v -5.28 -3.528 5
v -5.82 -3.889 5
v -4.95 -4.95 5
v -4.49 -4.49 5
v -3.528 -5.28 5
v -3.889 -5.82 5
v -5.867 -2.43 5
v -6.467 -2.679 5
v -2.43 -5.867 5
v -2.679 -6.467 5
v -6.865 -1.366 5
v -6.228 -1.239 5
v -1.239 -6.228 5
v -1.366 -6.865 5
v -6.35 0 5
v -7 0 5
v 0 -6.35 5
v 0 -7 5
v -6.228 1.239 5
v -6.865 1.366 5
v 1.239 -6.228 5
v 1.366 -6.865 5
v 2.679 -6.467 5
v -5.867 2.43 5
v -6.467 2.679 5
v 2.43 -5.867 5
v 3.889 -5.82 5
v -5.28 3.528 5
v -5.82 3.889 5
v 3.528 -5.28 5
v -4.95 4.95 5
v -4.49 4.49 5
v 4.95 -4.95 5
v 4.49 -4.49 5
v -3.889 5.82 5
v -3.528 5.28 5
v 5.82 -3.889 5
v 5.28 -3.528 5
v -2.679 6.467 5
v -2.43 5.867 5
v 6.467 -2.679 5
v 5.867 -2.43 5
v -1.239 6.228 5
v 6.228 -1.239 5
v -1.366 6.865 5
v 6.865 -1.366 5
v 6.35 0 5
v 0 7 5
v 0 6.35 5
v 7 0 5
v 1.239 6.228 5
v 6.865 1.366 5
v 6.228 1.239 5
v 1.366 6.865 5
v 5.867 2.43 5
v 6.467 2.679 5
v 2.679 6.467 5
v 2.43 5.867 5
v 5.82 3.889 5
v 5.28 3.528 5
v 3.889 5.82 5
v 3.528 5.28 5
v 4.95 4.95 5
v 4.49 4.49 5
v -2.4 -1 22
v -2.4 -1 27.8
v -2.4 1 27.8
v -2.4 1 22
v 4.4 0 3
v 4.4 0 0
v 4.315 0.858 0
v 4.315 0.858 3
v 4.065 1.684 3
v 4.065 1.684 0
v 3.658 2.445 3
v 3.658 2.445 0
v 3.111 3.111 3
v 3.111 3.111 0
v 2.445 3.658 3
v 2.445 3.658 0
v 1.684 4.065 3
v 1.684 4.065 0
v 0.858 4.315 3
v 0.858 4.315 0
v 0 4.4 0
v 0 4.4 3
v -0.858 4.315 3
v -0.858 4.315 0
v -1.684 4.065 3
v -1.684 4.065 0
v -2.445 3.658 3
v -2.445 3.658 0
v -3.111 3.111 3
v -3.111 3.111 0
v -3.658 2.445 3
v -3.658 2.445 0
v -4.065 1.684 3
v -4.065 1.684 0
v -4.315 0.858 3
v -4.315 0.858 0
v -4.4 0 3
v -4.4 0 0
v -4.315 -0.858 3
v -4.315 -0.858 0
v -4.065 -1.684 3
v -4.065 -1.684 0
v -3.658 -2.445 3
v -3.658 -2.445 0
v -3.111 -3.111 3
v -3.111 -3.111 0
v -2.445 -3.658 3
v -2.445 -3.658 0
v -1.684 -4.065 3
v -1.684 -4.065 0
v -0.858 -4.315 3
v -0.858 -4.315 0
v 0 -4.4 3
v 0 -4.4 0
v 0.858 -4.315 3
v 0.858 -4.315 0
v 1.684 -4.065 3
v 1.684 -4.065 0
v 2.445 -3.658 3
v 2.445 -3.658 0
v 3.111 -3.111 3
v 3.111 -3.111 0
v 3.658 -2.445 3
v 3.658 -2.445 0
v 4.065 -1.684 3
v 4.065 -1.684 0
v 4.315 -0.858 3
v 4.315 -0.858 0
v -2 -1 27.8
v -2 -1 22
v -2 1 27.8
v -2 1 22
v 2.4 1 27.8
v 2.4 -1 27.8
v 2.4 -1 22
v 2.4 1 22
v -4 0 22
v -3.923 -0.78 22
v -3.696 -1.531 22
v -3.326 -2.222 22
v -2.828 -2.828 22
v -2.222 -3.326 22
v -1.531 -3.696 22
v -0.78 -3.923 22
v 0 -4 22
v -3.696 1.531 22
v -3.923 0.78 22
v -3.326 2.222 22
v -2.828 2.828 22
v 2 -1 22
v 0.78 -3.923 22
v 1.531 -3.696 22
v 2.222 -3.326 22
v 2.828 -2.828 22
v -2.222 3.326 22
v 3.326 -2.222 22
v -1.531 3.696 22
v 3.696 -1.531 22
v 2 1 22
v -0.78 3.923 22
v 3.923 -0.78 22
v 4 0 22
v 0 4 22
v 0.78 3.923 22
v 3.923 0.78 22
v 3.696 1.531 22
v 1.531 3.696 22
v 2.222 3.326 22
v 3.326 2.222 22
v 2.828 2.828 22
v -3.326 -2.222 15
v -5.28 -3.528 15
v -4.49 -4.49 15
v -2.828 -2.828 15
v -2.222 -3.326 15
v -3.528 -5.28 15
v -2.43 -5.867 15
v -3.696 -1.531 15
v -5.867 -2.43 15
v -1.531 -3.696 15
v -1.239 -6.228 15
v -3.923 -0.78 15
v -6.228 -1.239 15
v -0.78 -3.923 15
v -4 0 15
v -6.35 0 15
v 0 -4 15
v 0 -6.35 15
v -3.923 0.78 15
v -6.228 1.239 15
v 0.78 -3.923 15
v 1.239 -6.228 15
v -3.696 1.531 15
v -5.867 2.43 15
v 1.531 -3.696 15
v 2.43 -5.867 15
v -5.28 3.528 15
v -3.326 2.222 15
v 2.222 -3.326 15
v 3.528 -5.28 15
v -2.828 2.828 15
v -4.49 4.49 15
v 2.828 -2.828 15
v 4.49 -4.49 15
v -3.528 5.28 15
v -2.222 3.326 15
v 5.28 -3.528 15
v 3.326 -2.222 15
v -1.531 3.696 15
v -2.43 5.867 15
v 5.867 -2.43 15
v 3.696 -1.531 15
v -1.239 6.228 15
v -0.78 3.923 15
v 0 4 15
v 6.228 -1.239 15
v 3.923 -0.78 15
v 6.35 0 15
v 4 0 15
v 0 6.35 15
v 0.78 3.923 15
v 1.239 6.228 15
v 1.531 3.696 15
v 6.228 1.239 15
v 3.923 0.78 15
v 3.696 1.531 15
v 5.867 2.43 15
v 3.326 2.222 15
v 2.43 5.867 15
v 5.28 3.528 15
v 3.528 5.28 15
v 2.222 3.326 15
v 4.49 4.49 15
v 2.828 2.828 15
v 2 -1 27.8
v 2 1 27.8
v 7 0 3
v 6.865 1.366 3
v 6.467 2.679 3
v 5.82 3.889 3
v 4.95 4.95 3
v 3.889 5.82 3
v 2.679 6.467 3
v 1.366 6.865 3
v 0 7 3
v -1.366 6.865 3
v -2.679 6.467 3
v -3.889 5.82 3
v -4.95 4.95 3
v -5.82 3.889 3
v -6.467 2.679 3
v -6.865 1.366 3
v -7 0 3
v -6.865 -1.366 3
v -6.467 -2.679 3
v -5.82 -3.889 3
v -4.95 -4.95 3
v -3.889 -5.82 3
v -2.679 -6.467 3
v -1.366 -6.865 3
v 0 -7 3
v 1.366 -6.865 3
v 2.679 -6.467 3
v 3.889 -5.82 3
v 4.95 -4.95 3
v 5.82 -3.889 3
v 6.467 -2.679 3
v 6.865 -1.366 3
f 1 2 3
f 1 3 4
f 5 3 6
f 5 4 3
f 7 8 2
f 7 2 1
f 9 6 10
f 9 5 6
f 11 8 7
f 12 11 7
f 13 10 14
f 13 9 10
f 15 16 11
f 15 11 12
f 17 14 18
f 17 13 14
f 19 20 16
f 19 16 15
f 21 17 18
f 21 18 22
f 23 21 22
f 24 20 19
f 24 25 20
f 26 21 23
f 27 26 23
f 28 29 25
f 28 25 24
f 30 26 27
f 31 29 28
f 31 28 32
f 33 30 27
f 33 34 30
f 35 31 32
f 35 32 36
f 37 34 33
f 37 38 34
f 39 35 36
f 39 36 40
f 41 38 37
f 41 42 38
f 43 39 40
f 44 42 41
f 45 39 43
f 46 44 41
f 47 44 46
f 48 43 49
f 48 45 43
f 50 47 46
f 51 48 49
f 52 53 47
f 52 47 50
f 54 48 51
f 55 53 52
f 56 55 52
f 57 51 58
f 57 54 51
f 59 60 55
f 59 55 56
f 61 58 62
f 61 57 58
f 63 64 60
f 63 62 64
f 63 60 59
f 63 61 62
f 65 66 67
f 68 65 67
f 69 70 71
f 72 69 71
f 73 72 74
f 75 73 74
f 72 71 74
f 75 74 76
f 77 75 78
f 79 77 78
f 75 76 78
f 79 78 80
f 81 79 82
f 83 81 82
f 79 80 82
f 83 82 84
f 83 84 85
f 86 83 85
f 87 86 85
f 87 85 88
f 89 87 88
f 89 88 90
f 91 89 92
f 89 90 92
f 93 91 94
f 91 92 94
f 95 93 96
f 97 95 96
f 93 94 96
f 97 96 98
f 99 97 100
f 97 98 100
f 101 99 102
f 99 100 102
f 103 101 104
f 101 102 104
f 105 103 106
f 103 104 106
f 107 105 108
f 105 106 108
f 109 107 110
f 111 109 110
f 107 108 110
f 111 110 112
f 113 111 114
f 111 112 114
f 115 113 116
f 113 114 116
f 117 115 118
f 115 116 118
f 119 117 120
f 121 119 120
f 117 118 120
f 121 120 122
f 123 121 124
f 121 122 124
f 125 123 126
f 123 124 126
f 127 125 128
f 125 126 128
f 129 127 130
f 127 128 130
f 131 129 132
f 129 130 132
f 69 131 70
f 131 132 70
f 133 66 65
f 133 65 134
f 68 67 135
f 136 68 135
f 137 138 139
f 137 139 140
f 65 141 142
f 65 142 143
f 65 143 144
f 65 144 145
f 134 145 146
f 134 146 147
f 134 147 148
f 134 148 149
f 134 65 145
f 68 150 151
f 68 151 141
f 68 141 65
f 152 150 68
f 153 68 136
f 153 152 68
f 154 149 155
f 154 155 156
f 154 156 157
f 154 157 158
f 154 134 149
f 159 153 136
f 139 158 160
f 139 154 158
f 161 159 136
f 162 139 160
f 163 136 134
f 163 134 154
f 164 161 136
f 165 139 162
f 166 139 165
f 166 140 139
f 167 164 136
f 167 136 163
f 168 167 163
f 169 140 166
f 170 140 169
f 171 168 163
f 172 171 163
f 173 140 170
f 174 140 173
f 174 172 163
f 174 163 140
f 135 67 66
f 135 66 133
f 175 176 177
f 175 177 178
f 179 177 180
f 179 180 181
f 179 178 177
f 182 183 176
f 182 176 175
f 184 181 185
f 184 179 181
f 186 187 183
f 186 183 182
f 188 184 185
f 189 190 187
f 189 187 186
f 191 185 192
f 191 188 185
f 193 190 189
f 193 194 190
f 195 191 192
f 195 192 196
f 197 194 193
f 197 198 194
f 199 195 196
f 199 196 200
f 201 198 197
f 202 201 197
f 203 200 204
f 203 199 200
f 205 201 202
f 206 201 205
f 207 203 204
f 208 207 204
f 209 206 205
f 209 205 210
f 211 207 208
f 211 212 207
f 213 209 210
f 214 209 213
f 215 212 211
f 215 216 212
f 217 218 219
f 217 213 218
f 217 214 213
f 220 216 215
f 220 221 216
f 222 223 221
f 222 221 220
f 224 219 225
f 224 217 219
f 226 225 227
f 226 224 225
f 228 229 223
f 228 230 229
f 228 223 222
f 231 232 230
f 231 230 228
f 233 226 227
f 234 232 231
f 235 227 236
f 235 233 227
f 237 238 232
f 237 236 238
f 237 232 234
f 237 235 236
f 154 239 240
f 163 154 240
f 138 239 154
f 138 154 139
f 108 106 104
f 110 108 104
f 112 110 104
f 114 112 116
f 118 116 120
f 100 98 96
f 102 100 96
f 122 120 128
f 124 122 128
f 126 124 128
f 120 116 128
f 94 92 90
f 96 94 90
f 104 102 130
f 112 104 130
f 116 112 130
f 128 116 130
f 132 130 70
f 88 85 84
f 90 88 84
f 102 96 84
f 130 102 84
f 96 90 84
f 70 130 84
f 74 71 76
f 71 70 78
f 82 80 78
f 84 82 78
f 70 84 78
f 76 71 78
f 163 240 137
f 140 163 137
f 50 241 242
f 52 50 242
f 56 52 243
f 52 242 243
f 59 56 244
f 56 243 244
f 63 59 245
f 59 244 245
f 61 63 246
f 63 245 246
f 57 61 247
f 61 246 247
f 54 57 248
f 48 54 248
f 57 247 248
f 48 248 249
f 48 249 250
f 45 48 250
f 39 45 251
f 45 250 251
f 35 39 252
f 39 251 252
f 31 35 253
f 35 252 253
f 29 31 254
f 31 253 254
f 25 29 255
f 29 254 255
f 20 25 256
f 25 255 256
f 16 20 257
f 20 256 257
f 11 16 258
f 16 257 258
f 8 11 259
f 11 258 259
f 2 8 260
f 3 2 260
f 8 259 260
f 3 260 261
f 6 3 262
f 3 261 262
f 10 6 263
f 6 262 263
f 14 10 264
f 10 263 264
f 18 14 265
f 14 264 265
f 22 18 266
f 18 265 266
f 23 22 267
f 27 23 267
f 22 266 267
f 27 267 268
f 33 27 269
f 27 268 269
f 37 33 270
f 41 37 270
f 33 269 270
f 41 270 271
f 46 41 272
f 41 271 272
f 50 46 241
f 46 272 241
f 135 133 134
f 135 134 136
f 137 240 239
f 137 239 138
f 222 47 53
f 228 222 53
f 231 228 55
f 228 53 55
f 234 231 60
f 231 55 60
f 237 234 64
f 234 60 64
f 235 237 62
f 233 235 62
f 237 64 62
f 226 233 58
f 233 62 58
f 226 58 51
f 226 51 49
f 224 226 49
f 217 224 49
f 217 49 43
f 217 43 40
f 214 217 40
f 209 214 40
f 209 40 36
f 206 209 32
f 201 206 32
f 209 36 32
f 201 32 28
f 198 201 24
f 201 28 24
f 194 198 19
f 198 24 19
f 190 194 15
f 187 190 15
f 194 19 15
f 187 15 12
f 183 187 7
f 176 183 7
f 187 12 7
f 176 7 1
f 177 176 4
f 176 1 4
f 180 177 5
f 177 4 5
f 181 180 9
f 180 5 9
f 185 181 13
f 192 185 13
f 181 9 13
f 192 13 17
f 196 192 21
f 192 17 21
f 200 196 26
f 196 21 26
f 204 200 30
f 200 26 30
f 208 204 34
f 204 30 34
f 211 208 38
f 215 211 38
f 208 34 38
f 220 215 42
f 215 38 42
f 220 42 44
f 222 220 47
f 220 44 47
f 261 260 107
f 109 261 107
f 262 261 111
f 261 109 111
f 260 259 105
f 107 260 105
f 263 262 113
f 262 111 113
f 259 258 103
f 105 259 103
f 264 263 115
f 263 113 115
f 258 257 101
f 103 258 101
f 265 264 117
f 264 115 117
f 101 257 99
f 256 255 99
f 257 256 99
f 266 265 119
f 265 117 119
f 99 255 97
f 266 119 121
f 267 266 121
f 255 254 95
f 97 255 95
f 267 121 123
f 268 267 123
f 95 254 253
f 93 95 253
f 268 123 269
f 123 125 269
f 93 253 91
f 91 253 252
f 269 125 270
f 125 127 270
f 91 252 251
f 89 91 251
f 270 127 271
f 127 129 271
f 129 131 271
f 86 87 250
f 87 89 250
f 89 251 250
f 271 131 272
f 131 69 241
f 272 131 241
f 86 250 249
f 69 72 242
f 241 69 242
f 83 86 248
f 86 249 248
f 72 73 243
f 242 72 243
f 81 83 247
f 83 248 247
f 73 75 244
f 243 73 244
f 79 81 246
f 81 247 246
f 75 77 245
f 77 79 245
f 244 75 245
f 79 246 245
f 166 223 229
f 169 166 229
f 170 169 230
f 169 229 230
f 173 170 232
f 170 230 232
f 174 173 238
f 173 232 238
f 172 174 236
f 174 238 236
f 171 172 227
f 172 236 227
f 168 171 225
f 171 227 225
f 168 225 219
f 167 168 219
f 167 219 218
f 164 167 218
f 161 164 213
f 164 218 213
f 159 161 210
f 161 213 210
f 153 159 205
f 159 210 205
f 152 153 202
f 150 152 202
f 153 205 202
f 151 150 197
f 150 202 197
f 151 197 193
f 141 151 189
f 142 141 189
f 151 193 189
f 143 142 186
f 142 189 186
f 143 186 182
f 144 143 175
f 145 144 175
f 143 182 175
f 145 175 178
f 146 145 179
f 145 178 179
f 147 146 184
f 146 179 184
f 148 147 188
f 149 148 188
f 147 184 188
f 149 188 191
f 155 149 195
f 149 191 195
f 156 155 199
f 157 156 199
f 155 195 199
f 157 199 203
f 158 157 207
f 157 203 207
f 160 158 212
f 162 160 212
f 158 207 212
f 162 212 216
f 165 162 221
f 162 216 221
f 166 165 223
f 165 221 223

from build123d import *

# Parameters (mm, degrees)
ESQUISSE1_R        = 4.4
BOSS_EXTRU_1_DEPTH = 3
ESQUISSE2_R        = 7
BOSS_EXTRU_2_DEPTH = 2
ESQUISSE3_R        = 6.35
BOSS_EXTRU_3_DEPTH = 10
ESQUISSE4_R        = 4
BOSS_EXTRU_4_DEPTH = 7
ESQUISSE5_W        = 0.4
ESQUISSE5_H        = 2
BOSS_EXTRU_5_DEPTH = 5.8


with BuildPart() as part:
    # Esquisse1 → Boss.-Extru.1 (new body)
    with BuildSketch(Plane.XY):
        Circle(ESQUISSE1_R)
    extrude(amount=BOSS_EXTRU_1_DEPTH)

    # Esquisse2 → Boss.-Extru.2 (add)
    with BuildSketch(Plane.XY.offset(3)):
        Circle(ESQUISSE2_R)
    extrude(amount=BOSS_EXTRU_2_DEPTH)

    # Esquisse3 → Boss.-Extru.3 (add)
    with BuildSketch(Plane.XY.offset(5)):
        Circle(ESQUISSE3_R)
    extrude(amount=BOSS_EXTRU_3_DEPTH)

    # Esquisse4 → Boss.-Extru.4 (add)
    with BuildSketch(Plane.XY.offset(15)):
        Circle(ESQUISSE4_R)
    extrude(amount=BOSS_EXTRU_4_DEPTH)

    # Esquisse5 → Boss.-Extru.5 (add)
    with BuildSketch(Plane.XY.offset(22)):
        with Locations((-2.2, 0)):
            Rectangle(ESQUISSE5_W, ESQUISSE5_H)
        with Locations((2.2, 0)):
            Rectangle(ESQUISSE5_W, ESQUISSE5_H)
    extrude(amount=BOSS_EXTRU_5_DEPTH)


solid = part.part
